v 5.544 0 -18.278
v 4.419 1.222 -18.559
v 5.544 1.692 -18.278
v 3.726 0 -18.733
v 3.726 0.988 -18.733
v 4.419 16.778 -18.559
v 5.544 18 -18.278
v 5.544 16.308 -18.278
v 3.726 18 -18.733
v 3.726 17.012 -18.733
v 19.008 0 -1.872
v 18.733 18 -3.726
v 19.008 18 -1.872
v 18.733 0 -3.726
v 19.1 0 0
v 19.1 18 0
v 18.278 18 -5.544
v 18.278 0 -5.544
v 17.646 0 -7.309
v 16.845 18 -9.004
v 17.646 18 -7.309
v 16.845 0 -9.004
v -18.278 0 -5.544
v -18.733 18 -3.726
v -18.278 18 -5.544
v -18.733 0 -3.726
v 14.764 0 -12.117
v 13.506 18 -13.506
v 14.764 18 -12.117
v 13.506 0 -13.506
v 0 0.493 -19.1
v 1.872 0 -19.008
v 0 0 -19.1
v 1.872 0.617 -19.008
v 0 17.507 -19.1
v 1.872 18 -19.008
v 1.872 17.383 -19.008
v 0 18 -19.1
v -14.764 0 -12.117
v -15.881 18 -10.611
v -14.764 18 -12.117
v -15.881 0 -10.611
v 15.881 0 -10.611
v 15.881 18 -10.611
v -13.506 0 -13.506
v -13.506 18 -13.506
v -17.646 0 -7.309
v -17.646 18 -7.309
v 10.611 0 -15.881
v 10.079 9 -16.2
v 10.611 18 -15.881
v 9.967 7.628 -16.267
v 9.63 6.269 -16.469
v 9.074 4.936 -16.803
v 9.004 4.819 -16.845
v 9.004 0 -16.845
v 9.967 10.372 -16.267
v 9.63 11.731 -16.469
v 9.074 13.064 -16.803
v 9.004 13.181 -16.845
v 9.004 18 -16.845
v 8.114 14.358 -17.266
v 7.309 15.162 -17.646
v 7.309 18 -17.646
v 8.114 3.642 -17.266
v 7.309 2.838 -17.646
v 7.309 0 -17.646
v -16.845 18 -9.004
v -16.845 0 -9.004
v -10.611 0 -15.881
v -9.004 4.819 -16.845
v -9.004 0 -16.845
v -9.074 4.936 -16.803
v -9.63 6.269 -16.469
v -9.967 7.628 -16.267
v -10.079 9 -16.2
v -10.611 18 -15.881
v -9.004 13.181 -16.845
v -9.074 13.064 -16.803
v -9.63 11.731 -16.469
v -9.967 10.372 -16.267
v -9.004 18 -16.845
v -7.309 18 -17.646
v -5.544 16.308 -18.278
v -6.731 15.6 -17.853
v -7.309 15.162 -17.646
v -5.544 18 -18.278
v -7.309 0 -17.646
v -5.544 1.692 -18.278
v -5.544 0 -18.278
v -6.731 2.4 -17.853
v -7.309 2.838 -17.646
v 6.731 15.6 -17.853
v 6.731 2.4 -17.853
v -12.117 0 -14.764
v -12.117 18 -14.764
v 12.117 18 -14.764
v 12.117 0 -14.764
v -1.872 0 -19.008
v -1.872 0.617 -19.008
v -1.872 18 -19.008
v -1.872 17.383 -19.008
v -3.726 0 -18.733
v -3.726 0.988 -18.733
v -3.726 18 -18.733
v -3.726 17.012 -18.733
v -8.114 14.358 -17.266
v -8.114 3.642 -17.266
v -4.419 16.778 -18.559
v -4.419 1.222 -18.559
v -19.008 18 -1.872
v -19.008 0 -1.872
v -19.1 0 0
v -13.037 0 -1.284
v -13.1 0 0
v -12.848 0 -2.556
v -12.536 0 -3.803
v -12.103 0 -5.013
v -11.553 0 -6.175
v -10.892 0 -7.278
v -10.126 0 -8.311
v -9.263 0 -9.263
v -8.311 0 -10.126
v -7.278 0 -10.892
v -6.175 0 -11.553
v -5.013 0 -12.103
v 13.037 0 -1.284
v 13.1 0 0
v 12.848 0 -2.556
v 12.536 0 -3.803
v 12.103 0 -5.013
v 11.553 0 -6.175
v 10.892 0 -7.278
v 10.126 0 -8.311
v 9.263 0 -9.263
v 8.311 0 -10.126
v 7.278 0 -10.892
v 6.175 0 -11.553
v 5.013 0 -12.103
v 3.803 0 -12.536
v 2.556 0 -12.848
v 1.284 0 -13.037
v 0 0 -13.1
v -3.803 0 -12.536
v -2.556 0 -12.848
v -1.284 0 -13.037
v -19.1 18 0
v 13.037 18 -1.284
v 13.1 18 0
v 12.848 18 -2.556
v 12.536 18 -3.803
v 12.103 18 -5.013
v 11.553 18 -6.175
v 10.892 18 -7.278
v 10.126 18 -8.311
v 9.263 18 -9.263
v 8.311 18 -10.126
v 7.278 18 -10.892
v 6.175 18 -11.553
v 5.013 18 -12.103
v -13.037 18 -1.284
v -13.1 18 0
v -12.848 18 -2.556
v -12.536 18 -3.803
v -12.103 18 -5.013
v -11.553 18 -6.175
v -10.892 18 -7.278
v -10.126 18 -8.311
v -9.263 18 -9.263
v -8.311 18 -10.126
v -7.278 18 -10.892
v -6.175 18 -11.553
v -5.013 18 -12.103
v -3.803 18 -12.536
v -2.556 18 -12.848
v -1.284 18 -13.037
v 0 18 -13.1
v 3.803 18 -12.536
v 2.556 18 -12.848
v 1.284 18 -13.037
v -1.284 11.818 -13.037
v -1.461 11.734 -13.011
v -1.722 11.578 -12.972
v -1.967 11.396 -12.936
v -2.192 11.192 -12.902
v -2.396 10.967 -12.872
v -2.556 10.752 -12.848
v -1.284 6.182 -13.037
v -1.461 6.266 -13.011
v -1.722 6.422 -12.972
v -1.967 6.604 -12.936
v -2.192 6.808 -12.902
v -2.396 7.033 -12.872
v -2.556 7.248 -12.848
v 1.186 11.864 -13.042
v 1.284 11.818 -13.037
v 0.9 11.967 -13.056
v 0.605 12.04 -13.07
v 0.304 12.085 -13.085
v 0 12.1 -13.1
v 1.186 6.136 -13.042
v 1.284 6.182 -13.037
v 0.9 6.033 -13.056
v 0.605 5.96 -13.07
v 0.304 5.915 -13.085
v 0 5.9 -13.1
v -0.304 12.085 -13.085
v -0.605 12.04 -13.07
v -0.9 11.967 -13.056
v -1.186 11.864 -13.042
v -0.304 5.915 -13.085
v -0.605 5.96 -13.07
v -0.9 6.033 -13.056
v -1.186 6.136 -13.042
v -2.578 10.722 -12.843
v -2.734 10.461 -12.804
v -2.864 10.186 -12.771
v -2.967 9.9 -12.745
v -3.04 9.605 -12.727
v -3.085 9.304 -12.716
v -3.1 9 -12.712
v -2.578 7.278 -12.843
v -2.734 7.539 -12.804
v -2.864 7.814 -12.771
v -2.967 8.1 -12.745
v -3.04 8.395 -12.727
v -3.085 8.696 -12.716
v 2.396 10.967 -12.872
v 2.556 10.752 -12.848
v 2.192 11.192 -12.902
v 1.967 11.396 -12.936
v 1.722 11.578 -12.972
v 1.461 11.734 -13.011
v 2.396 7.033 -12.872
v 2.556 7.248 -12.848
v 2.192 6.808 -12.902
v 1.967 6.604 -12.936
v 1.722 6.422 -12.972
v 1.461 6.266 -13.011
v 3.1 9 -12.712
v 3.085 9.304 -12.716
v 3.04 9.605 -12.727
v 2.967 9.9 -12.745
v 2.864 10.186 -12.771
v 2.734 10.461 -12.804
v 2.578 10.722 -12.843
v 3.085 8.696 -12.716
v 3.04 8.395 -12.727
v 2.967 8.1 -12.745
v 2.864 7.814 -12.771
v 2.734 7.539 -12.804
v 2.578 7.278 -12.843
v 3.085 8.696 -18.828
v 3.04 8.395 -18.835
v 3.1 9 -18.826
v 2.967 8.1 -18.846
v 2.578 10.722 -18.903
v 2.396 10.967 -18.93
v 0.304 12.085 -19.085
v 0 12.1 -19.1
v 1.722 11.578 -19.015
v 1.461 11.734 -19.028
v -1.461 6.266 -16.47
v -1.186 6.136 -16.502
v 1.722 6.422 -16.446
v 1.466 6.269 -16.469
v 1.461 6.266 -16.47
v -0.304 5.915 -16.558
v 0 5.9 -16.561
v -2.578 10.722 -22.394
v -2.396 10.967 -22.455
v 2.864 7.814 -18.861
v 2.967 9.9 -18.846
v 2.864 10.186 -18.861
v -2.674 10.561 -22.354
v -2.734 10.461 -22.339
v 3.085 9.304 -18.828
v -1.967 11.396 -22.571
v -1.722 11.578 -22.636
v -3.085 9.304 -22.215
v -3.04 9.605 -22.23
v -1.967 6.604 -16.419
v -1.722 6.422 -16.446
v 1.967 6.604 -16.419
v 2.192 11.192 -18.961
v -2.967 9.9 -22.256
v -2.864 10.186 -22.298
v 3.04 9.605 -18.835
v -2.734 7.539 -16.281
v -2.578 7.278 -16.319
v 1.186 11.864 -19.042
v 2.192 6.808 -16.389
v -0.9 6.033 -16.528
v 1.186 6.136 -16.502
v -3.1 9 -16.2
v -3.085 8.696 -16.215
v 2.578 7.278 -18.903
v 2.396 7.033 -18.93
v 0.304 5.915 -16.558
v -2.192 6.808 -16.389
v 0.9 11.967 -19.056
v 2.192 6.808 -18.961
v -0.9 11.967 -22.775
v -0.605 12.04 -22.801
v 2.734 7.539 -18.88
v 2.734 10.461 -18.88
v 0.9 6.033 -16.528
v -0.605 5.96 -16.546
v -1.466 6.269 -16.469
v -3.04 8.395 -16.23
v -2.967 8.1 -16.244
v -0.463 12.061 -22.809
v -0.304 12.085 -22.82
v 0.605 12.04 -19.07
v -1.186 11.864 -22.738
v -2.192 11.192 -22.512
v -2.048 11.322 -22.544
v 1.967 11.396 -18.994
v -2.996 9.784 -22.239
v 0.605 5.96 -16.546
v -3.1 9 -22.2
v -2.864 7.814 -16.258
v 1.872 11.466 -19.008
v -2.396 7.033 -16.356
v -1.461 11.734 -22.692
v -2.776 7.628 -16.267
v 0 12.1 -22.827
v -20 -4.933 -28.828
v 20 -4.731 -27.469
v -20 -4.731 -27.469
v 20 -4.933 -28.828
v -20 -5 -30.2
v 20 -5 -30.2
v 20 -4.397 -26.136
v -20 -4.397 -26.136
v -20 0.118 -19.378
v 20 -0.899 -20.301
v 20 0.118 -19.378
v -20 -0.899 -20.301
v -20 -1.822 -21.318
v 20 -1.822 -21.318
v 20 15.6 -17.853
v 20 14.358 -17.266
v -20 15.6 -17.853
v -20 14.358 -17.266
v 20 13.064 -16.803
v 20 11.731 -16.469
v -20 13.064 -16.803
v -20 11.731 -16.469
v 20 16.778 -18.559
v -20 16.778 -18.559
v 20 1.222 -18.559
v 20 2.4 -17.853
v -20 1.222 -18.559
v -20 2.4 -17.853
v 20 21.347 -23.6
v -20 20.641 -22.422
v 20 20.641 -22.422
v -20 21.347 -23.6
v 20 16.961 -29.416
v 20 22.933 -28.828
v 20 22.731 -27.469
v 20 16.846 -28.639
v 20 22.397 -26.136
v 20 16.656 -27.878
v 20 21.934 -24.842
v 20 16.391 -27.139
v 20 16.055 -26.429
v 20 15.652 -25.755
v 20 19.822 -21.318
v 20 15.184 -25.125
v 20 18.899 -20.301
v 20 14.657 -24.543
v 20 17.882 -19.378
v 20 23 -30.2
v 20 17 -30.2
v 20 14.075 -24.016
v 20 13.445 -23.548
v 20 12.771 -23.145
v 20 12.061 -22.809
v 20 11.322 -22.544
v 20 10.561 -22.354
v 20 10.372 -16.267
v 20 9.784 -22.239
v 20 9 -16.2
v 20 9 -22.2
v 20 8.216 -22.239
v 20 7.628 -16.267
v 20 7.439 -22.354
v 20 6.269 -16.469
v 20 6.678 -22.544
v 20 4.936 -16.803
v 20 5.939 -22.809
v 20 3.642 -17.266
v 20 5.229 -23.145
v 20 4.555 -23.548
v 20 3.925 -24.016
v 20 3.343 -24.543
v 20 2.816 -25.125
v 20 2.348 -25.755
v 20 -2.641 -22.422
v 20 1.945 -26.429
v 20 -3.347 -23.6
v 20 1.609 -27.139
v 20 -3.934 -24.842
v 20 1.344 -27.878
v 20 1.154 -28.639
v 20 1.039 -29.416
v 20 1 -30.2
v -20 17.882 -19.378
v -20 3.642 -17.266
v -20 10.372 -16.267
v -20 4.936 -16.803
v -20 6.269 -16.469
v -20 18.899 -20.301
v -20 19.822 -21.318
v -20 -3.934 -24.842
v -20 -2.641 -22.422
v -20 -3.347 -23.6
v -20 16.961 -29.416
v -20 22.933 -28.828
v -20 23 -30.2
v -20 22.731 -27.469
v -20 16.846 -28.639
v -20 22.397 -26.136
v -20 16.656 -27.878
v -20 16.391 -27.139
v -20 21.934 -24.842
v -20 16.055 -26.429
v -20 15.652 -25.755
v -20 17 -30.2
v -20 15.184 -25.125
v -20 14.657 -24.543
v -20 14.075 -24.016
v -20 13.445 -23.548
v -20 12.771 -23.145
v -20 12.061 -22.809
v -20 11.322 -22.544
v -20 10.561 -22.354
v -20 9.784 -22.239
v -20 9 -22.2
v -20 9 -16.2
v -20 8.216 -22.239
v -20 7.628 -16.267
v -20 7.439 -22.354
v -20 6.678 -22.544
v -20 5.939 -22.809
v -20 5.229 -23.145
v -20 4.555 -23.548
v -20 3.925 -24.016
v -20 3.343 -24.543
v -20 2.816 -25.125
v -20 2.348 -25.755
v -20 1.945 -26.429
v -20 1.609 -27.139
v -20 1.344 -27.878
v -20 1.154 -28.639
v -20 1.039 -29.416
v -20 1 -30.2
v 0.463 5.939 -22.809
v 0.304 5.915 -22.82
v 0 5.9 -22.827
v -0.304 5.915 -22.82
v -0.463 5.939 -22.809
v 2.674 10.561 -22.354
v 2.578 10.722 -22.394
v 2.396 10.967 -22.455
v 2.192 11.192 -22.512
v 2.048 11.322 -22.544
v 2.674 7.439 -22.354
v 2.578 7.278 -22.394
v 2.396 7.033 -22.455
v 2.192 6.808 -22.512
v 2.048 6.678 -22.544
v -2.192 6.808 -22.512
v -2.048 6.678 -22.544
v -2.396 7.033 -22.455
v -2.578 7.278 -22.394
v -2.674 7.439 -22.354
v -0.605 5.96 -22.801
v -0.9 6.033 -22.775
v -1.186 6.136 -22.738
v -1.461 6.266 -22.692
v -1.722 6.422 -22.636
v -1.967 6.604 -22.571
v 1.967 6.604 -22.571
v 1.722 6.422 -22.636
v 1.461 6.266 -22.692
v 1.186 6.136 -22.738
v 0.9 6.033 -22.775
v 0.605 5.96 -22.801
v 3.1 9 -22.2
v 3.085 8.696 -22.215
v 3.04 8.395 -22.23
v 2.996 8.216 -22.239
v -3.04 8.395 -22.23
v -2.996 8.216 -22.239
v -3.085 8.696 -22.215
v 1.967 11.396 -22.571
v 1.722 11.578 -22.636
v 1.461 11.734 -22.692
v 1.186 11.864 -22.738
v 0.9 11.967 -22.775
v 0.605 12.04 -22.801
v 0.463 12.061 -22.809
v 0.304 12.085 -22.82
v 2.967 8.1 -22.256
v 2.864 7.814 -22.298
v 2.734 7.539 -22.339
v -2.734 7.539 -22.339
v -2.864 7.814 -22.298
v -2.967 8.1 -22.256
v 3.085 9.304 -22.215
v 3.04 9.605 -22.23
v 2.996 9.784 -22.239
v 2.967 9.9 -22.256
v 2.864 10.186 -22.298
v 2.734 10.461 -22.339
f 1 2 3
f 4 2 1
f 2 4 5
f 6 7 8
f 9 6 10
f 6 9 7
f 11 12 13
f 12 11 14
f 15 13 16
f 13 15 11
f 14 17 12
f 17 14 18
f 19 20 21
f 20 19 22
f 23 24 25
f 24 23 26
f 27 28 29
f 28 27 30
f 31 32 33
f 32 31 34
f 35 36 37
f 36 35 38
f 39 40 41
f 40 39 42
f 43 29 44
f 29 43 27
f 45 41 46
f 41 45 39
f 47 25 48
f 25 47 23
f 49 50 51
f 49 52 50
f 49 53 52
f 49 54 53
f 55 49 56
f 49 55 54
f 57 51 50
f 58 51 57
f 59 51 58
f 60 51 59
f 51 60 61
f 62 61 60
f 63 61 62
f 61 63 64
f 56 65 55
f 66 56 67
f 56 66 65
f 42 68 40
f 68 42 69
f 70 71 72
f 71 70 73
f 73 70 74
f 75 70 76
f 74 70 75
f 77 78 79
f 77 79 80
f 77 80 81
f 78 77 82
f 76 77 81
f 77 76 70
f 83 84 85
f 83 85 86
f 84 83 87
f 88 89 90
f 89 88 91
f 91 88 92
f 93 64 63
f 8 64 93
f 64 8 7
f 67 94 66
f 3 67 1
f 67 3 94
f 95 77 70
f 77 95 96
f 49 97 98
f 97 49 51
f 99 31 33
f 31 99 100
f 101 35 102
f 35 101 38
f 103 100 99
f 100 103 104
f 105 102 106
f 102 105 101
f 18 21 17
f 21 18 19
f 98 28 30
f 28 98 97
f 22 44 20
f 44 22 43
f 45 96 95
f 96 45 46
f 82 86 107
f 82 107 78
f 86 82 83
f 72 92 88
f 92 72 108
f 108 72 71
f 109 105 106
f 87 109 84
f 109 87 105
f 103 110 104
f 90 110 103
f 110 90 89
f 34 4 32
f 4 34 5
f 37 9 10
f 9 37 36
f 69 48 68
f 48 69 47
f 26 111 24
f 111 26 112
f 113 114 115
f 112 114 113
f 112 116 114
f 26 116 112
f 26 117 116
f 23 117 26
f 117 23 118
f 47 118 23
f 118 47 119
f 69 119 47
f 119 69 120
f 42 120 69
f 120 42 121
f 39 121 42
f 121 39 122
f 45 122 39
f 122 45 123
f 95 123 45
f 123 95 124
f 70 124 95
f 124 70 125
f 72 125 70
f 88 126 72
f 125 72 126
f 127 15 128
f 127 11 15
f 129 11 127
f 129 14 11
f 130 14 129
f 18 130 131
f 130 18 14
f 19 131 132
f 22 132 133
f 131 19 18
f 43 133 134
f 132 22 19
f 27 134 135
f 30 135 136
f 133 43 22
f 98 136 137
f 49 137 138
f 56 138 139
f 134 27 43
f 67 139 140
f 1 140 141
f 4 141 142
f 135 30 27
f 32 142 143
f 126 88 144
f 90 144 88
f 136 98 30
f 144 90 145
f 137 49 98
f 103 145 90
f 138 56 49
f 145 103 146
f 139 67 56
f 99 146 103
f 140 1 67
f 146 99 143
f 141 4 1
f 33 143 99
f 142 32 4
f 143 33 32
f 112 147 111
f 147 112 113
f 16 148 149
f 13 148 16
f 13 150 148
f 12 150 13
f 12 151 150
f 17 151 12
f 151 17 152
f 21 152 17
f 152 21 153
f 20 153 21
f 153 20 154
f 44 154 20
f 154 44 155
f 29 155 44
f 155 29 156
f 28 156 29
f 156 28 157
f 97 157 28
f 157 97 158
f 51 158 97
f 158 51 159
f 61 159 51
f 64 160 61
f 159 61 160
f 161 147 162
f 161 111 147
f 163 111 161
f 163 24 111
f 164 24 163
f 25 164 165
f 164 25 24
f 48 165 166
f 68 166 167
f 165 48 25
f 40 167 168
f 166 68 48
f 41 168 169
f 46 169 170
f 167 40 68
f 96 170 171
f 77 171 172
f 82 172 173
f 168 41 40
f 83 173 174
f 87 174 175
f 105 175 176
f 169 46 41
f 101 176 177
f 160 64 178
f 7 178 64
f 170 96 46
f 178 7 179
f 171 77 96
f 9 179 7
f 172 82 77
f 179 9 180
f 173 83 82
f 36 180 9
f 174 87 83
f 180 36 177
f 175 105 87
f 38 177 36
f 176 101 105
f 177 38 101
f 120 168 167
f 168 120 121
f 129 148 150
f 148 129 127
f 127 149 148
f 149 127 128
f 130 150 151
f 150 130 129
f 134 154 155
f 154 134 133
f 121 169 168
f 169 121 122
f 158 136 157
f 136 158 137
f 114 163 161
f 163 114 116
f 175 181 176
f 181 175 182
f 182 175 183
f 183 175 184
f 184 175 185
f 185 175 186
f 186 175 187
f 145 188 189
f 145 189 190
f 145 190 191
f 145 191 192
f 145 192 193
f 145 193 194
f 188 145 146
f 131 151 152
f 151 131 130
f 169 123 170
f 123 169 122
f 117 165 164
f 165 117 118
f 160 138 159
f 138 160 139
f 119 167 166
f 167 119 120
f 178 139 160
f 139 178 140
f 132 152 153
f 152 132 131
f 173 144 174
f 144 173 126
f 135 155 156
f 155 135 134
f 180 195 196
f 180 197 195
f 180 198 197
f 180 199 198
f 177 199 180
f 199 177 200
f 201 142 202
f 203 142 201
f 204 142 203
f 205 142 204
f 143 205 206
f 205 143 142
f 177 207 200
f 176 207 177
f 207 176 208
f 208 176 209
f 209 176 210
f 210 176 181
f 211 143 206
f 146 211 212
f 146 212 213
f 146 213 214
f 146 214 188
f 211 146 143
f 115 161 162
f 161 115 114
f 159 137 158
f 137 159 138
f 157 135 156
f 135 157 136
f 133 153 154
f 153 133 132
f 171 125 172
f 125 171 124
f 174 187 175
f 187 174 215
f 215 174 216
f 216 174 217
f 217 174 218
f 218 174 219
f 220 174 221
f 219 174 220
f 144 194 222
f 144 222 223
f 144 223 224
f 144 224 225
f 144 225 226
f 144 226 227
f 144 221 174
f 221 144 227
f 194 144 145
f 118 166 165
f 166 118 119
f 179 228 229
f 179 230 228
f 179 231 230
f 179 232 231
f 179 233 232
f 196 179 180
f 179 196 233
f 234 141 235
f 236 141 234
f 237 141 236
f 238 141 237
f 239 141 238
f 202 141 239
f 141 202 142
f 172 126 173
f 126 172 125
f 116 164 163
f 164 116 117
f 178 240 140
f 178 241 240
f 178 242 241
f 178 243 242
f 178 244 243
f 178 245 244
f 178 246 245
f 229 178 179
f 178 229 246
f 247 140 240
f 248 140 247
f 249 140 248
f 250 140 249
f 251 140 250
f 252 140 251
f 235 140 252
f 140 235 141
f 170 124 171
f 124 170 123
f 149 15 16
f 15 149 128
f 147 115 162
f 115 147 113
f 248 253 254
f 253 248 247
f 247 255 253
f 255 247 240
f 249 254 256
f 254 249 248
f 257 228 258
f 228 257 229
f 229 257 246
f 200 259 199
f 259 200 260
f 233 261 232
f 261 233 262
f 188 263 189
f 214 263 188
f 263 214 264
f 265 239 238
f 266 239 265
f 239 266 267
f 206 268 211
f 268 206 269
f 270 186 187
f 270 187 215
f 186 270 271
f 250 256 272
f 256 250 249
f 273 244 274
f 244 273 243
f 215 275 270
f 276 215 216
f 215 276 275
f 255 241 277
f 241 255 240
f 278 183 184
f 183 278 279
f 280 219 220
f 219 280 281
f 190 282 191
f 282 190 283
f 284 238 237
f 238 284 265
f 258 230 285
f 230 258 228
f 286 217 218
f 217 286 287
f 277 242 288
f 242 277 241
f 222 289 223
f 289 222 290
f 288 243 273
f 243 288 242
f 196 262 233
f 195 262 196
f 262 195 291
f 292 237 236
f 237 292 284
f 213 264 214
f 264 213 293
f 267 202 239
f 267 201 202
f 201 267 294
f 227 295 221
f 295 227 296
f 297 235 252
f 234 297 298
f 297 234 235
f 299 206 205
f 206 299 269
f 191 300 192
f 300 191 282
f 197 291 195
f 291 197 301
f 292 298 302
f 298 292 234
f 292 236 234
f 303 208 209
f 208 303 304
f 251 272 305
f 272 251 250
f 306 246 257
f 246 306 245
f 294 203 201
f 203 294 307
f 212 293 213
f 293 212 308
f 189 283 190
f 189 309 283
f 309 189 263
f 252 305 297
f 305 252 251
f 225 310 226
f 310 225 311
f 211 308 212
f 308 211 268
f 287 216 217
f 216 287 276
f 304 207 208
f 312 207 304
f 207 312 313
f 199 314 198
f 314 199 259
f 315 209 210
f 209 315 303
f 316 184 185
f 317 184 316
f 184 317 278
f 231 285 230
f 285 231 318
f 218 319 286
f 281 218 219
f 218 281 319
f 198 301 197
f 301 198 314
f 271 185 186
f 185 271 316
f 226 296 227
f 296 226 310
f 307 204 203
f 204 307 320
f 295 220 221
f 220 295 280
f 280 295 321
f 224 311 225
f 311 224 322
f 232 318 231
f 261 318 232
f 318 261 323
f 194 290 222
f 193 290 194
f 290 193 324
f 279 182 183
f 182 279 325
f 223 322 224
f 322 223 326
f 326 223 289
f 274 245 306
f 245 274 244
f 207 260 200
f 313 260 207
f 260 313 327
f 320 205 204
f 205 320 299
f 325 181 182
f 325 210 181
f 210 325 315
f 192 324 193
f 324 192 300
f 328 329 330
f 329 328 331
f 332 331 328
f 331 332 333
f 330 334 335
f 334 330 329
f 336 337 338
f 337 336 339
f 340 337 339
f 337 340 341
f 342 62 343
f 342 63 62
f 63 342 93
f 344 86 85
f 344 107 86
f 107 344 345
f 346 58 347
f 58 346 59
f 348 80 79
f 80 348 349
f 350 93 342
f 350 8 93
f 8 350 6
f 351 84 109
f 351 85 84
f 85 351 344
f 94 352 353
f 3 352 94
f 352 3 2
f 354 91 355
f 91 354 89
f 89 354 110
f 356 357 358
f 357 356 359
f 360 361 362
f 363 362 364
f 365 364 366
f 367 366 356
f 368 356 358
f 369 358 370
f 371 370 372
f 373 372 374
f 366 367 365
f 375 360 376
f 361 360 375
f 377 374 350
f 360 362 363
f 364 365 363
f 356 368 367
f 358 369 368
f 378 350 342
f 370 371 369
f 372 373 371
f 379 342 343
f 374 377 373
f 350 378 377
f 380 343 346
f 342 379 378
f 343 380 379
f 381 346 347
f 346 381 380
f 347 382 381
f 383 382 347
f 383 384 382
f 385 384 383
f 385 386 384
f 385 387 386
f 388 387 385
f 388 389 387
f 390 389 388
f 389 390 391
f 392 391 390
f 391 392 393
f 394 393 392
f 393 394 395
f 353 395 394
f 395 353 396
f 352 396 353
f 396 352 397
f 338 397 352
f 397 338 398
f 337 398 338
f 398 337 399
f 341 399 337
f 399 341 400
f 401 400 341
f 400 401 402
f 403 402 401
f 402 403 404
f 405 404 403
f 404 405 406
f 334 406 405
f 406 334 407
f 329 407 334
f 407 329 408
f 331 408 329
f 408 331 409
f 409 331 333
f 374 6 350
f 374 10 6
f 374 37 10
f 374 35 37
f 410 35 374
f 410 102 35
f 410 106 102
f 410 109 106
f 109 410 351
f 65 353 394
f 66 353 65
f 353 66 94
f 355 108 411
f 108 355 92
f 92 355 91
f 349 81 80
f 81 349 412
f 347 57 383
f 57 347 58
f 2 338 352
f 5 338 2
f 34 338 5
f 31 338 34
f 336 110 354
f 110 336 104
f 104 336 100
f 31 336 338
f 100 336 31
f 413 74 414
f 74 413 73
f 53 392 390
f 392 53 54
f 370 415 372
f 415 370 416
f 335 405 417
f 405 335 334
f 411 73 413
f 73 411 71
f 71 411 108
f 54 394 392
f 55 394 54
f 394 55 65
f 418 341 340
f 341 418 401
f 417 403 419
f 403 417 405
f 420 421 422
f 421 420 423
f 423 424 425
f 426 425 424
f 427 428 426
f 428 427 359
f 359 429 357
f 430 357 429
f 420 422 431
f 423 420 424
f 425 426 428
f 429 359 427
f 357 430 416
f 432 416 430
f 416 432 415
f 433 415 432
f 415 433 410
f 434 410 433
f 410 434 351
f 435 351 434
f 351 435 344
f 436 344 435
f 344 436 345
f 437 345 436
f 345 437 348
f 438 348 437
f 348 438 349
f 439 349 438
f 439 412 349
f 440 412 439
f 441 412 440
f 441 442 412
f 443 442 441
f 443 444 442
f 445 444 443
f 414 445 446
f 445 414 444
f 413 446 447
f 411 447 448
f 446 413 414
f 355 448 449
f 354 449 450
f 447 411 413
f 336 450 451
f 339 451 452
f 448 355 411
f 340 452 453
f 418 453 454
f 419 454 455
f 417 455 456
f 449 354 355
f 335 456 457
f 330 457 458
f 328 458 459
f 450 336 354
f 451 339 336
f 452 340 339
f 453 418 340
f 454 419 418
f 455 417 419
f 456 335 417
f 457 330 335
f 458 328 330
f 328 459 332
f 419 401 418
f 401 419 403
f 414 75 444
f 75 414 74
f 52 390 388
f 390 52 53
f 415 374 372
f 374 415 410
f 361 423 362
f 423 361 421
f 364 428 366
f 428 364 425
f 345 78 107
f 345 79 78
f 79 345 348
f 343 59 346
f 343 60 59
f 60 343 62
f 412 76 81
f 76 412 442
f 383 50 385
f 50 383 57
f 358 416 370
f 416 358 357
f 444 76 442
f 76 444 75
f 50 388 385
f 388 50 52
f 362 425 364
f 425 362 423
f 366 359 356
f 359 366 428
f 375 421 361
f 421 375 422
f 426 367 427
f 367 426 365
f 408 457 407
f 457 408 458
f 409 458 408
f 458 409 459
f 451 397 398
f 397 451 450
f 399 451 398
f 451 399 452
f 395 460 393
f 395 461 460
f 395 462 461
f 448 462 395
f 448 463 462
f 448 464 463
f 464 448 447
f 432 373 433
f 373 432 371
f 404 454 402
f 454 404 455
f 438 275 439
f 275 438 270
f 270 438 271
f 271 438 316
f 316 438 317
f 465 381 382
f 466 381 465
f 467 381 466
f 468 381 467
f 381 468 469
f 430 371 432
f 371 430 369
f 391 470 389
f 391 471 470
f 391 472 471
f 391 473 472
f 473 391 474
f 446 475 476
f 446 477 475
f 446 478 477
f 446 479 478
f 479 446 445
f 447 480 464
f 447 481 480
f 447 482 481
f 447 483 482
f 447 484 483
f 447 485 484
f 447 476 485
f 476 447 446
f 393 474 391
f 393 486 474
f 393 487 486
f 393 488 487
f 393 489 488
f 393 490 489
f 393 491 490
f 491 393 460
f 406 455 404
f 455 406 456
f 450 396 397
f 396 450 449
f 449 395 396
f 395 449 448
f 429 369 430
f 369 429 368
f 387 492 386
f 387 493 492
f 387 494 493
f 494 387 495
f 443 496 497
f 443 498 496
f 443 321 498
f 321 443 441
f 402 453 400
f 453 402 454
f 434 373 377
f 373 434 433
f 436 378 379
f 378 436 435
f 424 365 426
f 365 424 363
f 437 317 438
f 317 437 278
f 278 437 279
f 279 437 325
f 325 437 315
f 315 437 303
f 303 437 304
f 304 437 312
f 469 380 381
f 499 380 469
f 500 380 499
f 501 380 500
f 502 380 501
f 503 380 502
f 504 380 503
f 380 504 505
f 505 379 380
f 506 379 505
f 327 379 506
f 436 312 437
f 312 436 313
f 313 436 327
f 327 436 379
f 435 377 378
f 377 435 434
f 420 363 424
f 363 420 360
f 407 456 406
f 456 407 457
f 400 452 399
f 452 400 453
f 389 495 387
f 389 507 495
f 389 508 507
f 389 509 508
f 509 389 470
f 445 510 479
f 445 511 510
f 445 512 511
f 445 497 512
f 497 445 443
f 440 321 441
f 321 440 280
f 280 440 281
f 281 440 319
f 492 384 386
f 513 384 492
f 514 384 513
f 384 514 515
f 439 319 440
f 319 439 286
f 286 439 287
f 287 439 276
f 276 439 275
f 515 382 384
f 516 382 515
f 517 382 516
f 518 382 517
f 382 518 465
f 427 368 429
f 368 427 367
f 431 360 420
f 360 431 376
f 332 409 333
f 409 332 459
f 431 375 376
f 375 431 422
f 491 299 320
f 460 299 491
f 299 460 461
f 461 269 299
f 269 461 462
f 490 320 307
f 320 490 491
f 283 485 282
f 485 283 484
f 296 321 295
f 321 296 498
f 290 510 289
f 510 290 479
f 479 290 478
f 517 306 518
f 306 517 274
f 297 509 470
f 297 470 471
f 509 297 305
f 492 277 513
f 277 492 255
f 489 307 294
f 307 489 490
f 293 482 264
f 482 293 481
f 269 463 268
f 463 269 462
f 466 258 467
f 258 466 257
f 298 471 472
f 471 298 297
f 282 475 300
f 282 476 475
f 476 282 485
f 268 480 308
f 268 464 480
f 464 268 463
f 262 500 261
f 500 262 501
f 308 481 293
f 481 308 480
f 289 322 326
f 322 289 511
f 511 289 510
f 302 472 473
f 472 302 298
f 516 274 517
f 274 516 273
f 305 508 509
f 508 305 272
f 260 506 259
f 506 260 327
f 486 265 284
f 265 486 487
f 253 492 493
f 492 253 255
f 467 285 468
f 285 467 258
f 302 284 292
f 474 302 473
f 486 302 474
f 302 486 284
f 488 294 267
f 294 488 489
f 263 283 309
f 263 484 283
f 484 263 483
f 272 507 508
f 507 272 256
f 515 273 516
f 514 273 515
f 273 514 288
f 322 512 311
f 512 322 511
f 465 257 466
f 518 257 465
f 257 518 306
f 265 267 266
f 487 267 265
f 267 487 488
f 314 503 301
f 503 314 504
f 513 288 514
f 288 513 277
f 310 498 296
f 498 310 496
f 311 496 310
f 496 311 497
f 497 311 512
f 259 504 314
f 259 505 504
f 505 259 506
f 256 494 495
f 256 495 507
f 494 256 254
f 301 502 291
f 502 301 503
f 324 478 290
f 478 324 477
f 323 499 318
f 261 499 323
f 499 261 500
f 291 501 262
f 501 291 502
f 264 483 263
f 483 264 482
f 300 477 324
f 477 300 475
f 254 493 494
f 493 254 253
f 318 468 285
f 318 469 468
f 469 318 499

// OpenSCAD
$fn = 64;
xy_ajuste = 0.2;



//----------- Eixo de fixação

dint_eixo = 26 + xy_ajuste; //diametro do cano do tripé
dext_eixo = dint_eixo + 12; 
h_eixo = 18;

d_furo_m6 = 6 + xy_ajuste;


module fixa_eixo(dext, dint, hx ){ 
	difference(){
		cylinder(h=hx, r=dext/2 );

		cylinder(h=hx, r=dint/2 );

		translate([-dext/2, -dext/2, 0]) //corte central
			cube([dext, dext/2, hx]);

	translate([0,0,hx/2])
	rotate([-90,0,0])
	cylinder(h=hx*2, r=d_furo_m6/2 );

	}


}


//apoio horizontal
dint_cano = 16;
dext_cano = dint_cano + 12;
h_cano = 40;


rotate([-90,0,0]){

//apoio vertical
fixa_eixo(dext_eixo, dint_eixo, h_eixo);

//parte colada ao link
translate([h_cano/2, dext_eixo-8, h_eixo/2])
rotate([180,90,0])
	fixa_eixo(dext_cano, dint_cano, h_cano);

}
